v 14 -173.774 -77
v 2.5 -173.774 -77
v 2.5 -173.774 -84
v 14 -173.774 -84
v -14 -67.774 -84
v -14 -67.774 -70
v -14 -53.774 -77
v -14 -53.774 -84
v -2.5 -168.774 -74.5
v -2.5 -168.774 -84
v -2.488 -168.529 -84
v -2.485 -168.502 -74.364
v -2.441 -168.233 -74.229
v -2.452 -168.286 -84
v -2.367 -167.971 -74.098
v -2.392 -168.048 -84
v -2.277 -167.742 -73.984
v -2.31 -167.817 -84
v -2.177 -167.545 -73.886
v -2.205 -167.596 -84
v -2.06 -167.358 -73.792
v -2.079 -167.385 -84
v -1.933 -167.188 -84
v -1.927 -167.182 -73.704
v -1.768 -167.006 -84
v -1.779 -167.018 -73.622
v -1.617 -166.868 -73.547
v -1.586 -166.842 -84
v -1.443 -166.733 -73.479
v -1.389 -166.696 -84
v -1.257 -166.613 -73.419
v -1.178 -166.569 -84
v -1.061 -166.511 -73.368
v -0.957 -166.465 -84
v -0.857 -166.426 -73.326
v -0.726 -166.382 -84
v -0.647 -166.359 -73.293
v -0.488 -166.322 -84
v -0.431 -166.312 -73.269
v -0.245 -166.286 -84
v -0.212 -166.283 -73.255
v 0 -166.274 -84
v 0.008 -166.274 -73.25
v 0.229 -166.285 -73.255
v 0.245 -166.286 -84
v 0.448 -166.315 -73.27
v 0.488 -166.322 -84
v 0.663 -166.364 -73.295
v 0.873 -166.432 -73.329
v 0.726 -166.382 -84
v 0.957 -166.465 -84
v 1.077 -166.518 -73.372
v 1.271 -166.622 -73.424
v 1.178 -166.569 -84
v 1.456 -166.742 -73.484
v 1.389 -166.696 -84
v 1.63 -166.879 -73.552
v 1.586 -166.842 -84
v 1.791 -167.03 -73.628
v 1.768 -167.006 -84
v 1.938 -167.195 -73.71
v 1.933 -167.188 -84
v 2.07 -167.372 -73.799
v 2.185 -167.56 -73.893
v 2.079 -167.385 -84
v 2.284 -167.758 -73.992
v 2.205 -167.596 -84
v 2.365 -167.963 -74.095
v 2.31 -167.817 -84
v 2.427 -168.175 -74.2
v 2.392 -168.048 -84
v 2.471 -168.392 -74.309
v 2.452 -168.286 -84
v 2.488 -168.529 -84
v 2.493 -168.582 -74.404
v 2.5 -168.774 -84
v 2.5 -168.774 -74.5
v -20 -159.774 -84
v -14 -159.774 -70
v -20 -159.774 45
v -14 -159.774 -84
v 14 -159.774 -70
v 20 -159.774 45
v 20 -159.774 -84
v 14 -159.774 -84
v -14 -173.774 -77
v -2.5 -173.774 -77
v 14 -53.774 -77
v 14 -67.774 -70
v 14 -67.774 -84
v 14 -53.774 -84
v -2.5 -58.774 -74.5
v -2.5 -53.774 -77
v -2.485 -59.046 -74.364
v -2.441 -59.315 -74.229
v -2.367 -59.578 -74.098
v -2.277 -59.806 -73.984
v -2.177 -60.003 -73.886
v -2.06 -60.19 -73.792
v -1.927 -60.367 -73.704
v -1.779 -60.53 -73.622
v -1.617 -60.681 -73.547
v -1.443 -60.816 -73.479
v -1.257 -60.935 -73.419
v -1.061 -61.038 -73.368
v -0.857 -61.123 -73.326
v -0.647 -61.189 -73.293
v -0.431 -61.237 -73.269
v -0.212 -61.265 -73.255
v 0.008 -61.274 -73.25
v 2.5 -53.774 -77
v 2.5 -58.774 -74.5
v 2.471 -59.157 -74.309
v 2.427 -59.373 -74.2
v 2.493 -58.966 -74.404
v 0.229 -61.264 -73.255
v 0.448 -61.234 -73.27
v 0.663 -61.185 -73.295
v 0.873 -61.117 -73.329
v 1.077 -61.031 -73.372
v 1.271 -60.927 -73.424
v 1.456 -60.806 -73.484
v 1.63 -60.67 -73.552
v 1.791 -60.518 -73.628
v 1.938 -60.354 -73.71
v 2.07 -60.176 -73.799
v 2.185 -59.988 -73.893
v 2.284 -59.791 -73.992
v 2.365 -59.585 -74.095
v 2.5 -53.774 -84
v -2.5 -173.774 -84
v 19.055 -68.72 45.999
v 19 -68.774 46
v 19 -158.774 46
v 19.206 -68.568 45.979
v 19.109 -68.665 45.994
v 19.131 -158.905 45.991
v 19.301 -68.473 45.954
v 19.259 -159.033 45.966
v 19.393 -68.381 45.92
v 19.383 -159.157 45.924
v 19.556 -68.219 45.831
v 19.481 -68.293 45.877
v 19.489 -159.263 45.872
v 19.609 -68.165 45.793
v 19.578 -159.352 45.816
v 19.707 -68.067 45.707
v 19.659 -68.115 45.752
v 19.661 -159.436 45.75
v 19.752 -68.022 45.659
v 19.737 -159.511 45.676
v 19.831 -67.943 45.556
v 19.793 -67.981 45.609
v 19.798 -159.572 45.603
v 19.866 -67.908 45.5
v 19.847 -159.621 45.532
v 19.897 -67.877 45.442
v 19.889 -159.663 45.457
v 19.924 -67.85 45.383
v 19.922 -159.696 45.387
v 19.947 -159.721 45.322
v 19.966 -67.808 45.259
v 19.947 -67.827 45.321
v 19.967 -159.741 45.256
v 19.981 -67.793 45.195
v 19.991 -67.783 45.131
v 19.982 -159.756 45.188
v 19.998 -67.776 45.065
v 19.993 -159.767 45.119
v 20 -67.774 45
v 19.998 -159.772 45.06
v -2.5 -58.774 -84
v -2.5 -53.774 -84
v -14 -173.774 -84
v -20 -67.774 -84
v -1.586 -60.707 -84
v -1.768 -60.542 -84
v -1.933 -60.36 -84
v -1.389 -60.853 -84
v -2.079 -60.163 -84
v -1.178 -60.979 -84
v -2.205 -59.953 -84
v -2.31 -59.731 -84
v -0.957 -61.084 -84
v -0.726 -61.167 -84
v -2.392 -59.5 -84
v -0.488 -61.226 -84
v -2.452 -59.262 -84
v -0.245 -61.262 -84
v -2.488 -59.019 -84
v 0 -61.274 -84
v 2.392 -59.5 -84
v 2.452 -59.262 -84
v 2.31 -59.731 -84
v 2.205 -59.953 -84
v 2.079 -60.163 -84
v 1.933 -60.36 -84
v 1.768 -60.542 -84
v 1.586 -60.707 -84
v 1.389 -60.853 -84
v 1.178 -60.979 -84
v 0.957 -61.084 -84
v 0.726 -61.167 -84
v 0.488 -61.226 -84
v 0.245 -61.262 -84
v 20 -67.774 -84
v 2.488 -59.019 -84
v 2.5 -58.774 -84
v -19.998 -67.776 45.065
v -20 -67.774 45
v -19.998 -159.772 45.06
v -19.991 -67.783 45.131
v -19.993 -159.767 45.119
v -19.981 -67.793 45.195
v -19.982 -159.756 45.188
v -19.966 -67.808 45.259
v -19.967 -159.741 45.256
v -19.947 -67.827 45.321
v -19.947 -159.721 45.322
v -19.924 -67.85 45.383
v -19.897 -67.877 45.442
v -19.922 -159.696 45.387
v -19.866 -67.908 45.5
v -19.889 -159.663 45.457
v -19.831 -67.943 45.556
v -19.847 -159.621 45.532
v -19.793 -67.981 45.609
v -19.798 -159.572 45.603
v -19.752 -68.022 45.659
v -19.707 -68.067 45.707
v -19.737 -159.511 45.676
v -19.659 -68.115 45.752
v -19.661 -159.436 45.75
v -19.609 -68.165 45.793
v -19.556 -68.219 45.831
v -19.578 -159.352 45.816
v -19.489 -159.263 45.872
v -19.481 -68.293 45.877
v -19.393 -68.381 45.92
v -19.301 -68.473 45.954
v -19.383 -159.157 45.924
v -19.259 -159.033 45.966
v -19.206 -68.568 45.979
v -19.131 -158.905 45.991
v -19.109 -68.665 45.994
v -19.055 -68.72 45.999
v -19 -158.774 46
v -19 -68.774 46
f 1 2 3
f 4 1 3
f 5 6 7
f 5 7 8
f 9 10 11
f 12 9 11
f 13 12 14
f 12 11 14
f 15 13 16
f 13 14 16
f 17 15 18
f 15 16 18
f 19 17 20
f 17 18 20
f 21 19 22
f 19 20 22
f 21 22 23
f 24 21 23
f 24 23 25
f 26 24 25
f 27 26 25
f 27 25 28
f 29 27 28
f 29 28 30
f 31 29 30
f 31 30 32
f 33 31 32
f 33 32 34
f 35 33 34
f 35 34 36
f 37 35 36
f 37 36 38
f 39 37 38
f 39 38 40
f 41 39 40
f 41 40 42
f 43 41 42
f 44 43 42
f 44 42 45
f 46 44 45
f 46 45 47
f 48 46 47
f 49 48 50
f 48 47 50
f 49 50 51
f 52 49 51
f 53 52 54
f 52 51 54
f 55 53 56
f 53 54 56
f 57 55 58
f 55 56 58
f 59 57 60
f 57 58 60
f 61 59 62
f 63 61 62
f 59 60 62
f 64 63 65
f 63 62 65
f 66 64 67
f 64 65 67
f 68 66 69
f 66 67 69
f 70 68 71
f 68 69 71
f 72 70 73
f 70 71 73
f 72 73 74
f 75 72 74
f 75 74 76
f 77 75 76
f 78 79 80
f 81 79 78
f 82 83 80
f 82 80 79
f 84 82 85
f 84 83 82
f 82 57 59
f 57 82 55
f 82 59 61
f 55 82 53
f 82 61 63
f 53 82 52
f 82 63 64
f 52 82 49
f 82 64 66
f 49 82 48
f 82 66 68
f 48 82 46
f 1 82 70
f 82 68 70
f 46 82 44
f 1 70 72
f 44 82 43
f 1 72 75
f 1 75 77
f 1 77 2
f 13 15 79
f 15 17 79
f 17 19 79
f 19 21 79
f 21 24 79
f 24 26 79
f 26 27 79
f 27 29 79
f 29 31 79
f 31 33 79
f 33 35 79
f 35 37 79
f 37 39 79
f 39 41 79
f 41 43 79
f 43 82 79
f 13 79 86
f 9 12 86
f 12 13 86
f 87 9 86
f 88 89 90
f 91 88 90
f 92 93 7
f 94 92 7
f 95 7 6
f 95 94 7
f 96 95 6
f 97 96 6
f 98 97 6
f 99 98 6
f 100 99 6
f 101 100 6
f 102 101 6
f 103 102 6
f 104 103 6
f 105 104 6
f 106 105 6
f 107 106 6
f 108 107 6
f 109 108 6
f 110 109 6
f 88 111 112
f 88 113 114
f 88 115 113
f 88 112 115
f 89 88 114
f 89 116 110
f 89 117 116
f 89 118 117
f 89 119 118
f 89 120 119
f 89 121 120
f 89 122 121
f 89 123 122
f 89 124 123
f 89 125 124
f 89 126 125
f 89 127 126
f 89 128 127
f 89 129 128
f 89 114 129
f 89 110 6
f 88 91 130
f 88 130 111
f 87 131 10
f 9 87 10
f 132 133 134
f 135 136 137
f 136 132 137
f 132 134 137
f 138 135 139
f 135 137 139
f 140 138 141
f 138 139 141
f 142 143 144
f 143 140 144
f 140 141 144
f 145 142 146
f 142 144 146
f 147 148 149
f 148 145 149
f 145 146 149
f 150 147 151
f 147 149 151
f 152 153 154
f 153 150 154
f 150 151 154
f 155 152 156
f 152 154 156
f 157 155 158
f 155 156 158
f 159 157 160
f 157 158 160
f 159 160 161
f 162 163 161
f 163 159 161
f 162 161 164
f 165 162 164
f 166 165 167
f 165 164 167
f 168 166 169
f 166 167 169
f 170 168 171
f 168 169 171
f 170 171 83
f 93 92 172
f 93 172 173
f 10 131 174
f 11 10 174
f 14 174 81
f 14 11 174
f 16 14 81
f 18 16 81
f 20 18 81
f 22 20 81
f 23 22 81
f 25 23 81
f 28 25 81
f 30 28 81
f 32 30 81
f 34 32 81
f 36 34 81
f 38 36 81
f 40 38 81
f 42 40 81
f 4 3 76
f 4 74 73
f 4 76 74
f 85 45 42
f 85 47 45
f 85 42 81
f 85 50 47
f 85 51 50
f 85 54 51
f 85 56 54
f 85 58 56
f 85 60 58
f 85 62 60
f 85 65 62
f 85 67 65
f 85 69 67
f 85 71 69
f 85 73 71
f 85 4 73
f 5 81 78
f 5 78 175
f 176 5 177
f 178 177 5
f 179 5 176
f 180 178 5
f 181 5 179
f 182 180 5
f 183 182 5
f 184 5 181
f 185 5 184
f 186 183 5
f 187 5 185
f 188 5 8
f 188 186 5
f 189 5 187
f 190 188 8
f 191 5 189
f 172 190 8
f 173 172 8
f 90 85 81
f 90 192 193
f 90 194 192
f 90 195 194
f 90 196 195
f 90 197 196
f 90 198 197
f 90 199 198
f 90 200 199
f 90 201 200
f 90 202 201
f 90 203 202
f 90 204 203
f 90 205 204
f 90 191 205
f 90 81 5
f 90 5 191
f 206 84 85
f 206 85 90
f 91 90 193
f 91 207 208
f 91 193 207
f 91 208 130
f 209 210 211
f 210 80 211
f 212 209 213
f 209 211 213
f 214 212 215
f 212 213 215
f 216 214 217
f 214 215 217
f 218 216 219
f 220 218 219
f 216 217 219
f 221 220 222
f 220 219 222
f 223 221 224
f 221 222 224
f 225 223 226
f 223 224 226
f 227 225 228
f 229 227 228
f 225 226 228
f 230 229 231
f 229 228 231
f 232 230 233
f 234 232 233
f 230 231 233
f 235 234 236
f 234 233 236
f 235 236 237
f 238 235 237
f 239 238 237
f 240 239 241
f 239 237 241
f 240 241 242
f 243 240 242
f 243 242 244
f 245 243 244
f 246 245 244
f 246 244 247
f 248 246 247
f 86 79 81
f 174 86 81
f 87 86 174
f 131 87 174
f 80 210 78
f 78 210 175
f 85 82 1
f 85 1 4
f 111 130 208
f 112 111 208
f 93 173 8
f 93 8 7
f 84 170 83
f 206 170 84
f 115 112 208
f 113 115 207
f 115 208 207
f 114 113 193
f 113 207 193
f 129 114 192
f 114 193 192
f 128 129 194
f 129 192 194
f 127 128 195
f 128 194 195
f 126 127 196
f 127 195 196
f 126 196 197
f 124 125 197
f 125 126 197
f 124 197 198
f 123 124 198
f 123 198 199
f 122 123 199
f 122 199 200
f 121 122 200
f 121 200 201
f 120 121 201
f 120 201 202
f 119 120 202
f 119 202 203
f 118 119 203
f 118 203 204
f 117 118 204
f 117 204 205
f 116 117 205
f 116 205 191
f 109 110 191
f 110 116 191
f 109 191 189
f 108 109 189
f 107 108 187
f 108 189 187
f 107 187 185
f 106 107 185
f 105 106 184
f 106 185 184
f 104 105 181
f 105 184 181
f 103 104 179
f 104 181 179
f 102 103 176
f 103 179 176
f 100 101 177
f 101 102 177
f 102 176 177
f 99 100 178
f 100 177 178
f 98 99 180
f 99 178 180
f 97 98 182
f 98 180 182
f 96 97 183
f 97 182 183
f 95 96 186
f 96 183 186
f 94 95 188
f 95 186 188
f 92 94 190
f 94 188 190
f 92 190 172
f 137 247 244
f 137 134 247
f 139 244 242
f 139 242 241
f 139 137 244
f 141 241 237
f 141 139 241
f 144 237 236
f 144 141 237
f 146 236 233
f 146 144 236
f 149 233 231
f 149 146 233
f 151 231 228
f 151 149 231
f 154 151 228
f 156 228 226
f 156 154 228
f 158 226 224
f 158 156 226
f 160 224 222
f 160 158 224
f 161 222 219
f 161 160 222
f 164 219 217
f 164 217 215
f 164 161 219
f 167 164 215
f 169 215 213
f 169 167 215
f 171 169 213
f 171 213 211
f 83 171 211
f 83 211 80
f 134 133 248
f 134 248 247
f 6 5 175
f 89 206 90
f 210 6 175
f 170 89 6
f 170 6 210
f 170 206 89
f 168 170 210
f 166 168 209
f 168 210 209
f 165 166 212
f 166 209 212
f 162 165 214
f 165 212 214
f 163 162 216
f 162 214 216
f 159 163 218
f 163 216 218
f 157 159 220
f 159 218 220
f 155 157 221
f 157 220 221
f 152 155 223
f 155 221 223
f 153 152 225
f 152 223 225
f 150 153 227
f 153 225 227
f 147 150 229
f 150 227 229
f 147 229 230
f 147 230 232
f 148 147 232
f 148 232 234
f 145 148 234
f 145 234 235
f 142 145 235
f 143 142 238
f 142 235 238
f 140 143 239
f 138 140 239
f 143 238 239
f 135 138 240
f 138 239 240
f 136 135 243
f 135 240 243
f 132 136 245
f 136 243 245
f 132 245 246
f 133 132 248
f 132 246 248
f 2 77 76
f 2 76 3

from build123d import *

# Parameters (mm, degrees)
F1_DEPTH      = 20
F1_DEPTH_BACK = 20
F2_DEPTH      = 14
F2_DEPTH_BACK = 14
F4_DEPTH      = 25
F5_ANGLE      = 90
F6_R          = 1


with BuildPart() as f1:
    # F0 (on Right) → F1 (new body, two sides)
    with BuildSketch(Plane.YZ) as f1_sk:
        Polygon((48.225797835, 46), (-67.774202165, 46), (-67.774202165, 0), (62.225797835, 0), (62.225797835, 46), align=None)
        Polygon((62.225797835, 0), (-67.774202165, 0), (-67.774202165, -46), (48.225797835, -46), (62.225797835, -46), align=None)
    extrude(amount=F1_DEPTH)
    extrude(f1_sk.sketch, amount=-F1_DEPTH_BACK)

    # F0 (on Right) → F2 (join, two sides)
    with BuildSketch(Plane.YZ) as f2_sk:
        Polygon((55.225797835, 60), (48.225797835, 46), (62.225797835, 46), (62.225797835, 60), align=None)
        Polygon((62.225797835, -60), (62.225797835, -46), (48.225797835, -46), (55.225797835, -60), align=None)
    extrude(amount=F2_DEPTH)
    extrude(f2_sk.sketch, amount=-F2_DEPTH_BACK)

    # F3 (on face) → F4 (cut)
    with BuildSketch(Plane(origin=(0, 62.225797835, 0), x_dir=(-1, 0, 0), z_dir=(0, 1, 0))):
        with BuildLine():
            Line((2.5, 55), (2.5, 60))
            Line((2.5, 60), (-2.5, 60))
            Line((-2.5, 60), (-2.5, 55))
            ThreePointArc((-2.5, 55), (0, 52.5), (2.5, 55))
        make_face()
        with BuildLine():
            Line((2.5, -60), (2.5, -55))
            ThreePointArc((2.5, -55), (0, -52.5), (-2.5, -55))
            Line((-2.5, -55), (-2.5, -60))
            Line((-2.5, -60), (2.5, -60))
        make_face()
    extrude(amount=-F4_DEPTH, mode=Mode.SUBTRACT)


with BuildPart() as f1_1:
    # F5: moved
    add(f1.part.rotate(Axis((0, -67.774202165, 46), (-1, 0, 0)), F5_ANGLE))

    # F6
    f6_edges = [f1_1.edges().sort_by_distance(p)[0] for p in [
        (0, -159.774202, 46),
        (0, -67.774202, 46),
        (-20, -113.774202, 46),
        (20, -113.774202, 46),
    ]]
    fillet(f6_edges, radius=F6_R)


solid = f1_1.part
